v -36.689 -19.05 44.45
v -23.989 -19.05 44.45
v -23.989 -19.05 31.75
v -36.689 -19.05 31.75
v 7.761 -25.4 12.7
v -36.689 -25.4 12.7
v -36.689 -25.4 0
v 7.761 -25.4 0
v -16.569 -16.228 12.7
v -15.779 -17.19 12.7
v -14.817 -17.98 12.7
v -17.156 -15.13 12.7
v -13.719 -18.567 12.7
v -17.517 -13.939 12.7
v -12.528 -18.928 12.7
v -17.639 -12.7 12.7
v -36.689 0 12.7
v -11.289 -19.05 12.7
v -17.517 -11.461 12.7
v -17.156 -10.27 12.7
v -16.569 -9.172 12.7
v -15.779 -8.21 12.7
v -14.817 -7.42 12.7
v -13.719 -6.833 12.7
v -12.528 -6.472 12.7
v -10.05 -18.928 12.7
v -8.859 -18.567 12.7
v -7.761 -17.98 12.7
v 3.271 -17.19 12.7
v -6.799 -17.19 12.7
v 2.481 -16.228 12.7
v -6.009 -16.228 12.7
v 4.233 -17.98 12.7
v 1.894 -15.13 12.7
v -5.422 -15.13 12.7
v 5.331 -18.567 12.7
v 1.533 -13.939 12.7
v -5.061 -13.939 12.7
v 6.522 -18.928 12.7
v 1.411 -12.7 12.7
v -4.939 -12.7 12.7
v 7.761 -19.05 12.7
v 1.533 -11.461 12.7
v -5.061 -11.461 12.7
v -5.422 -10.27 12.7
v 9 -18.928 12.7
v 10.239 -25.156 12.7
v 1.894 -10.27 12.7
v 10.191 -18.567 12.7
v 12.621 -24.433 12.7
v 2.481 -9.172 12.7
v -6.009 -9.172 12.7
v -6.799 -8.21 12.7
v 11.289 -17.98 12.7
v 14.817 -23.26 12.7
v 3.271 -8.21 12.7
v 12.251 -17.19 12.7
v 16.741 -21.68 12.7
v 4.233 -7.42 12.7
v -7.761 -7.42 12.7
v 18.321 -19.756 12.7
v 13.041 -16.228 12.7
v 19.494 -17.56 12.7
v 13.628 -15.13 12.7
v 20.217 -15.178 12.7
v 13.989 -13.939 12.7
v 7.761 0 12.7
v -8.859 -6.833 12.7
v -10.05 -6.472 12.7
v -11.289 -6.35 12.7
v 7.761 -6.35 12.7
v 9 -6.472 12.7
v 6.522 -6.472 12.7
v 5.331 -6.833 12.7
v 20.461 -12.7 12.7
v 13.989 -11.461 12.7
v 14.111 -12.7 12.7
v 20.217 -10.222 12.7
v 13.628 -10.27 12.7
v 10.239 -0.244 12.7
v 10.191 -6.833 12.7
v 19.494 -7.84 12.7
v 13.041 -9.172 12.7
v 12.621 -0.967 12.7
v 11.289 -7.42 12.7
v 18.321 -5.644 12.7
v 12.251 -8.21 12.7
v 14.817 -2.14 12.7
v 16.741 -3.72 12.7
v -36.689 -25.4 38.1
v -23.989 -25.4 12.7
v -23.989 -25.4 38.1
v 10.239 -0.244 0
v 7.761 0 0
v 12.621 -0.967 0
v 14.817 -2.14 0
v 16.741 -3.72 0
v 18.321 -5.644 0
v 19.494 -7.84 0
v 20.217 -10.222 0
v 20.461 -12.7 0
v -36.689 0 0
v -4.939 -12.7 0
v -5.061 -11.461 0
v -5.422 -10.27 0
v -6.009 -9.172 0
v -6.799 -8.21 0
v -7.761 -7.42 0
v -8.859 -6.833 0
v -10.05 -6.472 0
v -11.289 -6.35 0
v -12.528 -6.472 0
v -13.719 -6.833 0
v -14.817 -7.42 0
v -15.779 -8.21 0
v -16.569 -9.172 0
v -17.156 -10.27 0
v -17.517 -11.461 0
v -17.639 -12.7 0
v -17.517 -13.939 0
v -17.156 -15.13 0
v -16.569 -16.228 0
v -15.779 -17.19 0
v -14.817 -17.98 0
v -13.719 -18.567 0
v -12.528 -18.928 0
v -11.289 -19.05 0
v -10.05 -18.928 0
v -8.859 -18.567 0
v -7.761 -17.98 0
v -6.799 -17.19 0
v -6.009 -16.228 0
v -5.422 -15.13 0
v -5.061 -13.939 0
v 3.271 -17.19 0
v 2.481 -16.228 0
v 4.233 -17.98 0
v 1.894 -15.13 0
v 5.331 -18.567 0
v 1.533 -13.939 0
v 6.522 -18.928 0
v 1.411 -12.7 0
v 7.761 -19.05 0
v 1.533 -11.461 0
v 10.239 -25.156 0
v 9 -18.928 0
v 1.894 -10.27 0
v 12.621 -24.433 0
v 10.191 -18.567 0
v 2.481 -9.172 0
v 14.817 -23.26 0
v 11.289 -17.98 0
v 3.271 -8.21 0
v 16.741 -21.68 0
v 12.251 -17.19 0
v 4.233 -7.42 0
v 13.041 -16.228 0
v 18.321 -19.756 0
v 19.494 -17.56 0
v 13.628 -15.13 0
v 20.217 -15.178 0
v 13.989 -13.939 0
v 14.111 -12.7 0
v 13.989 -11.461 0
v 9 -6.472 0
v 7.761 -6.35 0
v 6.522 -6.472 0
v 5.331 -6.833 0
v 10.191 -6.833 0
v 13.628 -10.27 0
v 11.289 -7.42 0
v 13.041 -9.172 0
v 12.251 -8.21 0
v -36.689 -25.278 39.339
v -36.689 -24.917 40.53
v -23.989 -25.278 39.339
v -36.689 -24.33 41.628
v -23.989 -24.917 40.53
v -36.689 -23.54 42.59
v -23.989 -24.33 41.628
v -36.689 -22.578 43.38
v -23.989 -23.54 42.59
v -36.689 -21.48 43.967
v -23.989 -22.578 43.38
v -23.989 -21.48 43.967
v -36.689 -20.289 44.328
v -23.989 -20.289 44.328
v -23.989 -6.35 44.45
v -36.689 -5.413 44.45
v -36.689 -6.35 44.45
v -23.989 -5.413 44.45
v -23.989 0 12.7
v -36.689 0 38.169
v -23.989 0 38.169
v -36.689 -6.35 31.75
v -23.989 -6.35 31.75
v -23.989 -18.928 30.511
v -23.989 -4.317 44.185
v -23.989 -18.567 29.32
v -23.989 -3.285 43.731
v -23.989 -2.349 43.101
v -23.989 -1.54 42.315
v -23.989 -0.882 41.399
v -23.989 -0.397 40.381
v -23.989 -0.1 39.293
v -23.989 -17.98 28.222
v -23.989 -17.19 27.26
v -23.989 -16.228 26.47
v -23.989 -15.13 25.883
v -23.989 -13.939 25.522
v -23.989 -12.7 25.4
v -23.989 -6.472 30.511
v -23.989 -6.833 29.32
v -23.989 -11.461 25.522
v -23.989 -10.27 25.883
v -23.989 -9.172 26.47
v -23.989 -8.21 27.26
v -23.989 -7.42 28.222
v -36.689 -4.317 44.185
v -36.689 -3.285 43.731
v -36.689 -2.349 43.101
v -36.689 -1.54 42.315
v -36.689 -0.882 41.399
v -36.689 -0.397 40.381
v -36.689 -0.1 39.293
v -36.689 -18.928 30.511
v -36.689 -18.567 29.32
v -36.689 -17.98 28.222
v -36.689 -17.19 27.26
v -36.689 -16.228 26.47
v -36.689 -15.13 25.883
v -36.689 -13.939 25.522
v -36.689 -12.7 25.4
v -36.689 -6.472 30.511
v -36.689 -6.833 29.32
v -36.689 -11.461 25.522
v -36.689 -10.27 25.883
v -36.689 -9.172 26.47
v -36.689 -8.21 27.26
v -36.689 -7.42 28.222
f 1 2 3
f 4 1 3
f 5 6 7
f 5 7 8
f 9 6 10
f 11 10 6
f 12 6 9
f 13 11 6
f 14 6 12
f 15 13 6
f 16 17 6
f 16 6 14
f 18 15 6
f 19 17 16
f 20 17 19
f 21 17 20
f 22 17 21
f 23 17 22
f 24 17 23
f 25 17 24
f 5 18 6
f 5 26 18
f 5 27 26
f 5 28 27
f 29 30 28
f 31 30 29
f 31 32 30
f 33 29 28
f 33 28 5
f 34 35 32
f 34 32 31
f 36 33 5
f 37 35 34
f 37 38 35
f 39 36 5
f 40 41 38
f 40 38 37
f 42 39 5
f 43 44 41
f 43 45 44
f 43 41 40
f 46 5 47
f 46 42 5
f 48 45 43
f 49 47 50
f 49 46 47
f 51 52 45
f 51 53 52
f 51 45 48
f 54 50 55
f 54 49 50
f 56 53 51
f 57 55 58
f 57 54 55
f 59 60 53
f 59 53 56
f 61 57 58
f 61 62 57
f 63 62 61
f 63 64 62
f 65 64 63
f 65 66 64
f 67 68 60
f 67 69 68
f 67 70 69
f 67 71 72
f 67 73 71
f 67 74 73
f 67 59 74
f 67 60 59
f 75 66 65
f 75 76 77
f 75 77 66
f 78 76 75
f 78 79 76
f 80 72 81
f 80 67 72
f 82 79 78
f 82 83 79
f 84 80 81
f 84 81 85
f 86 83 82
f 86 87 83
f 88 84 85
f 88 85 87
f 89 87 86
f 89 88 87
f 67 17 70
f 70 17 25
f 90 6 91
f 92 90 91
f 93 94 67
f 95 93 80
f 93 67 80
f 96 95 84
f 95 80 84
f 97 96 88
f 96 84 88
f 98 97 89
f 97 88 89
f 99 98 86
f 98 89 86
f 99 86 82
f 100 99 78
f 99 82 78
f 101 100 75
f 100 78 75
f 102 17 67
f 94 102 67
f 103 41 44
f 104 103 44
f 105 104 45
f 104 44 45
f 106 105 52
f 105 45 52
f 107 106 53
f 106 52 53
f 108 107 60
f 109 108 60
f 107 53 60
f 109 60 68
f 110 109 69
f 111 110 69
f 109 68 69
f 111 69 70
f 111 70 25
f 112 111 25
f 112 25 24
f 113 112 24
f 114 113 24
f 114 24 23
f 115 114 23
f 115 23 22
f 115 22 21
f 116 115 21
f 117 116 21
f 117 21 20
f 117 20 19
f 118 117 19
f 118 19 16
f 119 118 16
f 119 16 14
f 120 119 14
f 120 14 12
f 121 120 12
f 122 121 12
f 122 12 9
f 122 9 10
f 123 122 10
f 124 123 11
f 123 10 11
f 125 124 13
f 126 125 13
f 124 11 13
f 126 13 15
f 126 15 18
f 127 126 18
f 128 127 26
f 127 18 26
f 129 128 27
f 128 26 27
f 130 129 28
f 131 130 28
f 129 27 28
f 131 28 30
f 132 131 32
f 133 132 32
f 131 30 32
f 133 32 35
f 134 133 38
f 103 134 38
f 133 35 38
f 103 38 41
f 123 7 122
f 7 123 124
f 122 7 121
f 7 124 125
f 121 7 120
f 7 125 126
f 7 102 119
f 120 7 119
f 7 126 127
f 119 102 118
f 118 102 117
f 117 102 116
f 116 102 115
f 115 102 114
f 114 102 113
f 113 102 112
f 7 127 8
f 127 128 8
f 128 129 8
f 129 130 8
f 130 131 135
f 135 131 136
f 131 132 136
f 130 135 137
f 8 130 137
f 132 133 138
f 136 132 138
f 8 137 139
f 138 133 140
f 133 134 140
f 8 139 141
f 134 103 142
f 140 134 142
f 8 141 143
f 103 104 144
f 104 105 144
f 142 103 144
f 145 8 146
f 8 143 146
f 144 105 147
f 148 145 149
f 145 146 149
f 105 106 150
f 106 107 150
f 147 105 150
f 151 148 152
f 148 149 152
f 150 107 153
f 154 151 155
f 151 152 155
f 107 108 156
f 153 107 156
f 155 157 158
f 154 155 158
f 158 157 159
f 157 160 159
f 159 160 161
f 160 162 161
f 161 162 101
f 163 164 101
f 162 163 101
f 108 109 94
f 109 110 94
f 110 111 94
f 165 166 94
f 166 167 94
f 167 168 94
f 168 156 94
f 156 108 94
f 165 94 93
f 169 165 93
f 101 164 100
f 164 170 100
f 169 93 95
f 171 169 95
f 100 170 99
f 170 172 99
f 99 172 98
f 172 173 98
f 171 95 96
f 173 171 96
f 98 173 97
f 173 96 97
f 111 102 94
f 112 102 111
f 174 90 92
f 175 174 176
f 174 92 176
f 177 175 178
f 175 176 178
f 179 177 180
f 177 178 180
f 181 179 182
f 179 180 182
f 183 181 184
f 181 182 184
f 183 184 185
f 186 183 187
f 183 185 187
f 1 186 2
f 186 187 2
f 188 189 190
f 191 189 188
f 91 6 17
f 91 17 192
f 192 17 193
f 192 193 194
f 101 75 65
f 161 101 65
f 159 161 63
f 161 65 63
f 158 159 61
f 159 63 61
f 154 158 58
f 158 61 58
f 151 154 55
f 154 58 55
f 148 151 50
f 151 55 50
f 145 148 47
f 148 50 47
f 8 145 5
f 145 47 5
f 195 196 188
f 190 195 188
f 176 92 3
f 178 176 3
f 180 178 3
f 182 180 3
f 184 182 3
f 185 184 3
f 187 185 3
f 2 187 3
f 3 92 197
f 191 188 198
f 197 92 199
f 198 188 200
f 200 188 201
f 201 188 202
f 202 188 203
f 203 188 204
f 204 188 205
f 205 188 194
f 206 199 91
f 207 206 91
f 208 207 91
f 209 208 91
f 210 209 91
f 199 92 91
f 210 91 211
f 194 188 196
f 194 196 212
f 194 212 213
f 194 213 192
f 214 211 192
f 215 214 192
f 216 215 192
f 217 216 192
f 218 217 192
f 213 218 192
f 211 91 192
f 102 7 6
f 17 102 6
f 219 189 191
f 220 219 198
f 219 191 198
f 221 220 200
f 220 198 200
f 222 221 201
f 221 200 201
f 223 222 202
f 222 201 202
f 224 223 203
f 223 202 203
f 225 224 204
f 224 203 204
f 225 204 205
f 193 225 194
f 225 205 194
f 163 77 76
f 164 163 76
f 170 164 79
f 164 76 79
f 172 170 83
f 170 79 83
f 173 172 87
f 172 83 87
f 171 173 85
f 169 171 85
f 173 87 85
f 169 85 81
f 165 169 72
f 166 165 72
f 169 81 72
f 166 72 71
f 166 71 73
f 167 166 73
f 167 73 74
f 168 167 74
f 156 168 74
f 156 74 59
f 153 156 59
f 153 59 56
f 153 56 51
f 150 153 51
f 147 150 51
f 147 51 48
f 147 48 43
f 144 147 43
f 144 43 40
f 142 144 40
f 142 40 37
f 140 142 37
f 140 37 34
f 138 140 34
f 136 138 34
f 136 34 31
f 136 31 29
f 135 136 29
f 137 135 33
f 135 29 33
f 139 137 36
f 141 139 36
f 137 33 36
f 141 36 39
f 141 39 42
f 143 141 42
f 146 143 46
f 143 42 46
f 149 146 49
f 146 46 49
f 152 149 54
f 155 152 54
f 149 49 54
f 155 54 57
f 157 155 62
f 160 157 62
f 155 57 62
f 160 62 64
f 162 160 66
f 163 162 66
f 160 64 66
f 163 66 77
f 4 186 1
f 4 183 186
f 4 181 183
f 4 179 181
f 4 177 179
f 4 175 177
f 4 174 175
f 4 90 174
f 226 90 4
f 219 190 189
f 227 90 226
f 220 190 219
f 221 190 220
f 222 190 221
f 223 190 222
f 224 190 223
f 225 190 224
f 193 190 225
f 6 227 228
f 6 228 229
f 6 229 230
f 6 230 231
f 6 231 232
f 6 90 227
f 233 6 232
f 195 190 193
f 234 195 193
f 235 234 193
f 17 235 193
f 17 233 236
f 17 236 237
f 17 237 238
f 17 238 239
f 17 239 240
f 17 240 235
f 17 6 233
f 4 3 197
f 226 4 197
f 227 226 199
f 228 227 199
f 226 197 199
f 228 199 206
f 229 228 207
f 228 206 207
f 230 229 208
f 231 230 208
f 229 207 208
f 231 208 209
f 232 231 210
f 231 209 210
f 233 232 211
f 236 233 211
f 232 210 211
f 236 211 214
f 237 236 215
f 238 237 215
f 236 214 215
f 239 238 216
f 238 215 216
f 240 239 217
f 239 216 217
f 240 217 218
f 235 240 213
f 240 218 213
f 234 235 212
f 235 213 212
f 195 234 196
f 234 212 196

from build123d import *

# Parameters (mm, degrees)
F0_W      = 57.15
F0_H      = 12.7
F1_DEPTH  = 25.4
F2_W      = 12.7
F2_H      = 25.4
F3_DEPTH  = 31.75
F5_DEPTH  = 25.4
F8_DEPTH  = 25.4
F9_DEPTH  = 25.4
F10_R     = 6.35
F11_DEPTH = 25.4
F13_DEPTH = 25.4


with BuildPart() as f1:
    # F0 (on Front) → F1 (new body)
    with BuildSketch(Plane.XZ):
        with Locations((-8.1138868551, 6.35)):
            Rectangle(F0_W, F0_H)
    extrude(amount=F1_DEPTH)

    # F10 (on face) → F11 (cut)
    with BuildSketch(Plane.XY.offset(12.7)):
        with Locations((-11.2888868551, -12.7)):
            Circle(F10_R)
        with Locations((7.7611131449, -12.7)):
            Circle(F10_R)
    extrude(amount=-F11_DEPTH, mode=Mode.SUBTRACT)

    # F12 (on face) → F13 (cut)
    with BuildSketch(Plane.XY.offset(12.7)):
        with BuildLine():
            ThreePointArc((20.4611131449, -12.7), (16.741369266, -21.6802561211), (7.7611131449, -25.4))
            Line((7.7611131449, -25.4), (20.4611131449, -25.4))
            Line((20.4611131449, -25.4), (20.4611131449, -12.7))
        make_face()
        with BuildLine():
            ThreePointArc((7.7611131449, 0), (16.741369266, -3.7197438789), (20.4611131449, -12.7))
            Line((20.4611131449, -12.7), (20.4611131449, 0))
            Line((20.4611131449, 0), (7.7611131449, 0))
        make_face()
    extrude(amount=-F13_DEPTH, mode=Mode.SUBTRACT)


with BuildPart() as f3:
    # F2 (on face) → F3 (new body)
    with BuildSketch(Plane.XY.offset(12.7)):
        with Locations((-30.3388868551, -12.7)):
            Rectangle(F2_W, F2_H)
    extrude(amount=F3_DEPTH)

    # F4 (on face) → F5 (cut)
    with BuildSketch(Plane.YZ.offset(-23.9888868551)):
        with BuildLine():
            ThreePointArc((-19.05, 31.75), (-12.7, 38.1), (-6.35, 31.75))
            Line((-6.35, 31.75), (-6.35, 44.45))
            Line((-6.35, 44.45), (-19.05, 44.45))
            Line((-19.05, 44.45), (-19.05, 31.75))
        make_face()
        with BuildLine():
            Line((-19.05, 31.75), (-6.35, 31.75))
            ThreePointArc((-6.35, 31.75), (-12.7, 38.1), (-19.05, 31.75))
        make_face()
        with BuildLine():
            ThreePointArc((-19.05, 31.75), (-12.7, 25.4), (-6.35, 31.75))
            Line((-6.35, 31.75), (-19.05, 31.75))
        make_face()
    extrude(amount=-F5_DEPTH, mode=Mode.SUBTRACT)

    # F6 (on face) → F8 (cut)
    with BuildSketch(Plane.YZ.offset(-23.9888868551)):
        with BuildLine():
            Line((-25.4, 44.45), (-25.4, 38.1))
            ThreePointArc((-25.4, 38.1), (-23.5401280605, 42.5901280605), (-19.05, 44.45))
            Line((-19.05, 44.45), (-25.4, 44.45))
        make_face()
    extrude(amount=-F8_DEPTH, mode=Mode.SUBTRACT)

    # F7 (on face) → F9 (cut)
    with BuildSketch(Plane.YZ.offset(-23.9888868551)):
        with BuildLine():
            ThreePointArc((-5.4130867227, 44.45), (-1.5400156284, 42.3151653979), (0, 38.1694989443))
            Line((0, 38.1694989443), (0, 44.45))
            Line((0, 44.45), (-5.4130867227, 44.45))
        make_face()
    extrude(amount=-F9_DEPTH, mode=Mode.SUBTRACT)


solid = Compound([f1.part, f3.part])
